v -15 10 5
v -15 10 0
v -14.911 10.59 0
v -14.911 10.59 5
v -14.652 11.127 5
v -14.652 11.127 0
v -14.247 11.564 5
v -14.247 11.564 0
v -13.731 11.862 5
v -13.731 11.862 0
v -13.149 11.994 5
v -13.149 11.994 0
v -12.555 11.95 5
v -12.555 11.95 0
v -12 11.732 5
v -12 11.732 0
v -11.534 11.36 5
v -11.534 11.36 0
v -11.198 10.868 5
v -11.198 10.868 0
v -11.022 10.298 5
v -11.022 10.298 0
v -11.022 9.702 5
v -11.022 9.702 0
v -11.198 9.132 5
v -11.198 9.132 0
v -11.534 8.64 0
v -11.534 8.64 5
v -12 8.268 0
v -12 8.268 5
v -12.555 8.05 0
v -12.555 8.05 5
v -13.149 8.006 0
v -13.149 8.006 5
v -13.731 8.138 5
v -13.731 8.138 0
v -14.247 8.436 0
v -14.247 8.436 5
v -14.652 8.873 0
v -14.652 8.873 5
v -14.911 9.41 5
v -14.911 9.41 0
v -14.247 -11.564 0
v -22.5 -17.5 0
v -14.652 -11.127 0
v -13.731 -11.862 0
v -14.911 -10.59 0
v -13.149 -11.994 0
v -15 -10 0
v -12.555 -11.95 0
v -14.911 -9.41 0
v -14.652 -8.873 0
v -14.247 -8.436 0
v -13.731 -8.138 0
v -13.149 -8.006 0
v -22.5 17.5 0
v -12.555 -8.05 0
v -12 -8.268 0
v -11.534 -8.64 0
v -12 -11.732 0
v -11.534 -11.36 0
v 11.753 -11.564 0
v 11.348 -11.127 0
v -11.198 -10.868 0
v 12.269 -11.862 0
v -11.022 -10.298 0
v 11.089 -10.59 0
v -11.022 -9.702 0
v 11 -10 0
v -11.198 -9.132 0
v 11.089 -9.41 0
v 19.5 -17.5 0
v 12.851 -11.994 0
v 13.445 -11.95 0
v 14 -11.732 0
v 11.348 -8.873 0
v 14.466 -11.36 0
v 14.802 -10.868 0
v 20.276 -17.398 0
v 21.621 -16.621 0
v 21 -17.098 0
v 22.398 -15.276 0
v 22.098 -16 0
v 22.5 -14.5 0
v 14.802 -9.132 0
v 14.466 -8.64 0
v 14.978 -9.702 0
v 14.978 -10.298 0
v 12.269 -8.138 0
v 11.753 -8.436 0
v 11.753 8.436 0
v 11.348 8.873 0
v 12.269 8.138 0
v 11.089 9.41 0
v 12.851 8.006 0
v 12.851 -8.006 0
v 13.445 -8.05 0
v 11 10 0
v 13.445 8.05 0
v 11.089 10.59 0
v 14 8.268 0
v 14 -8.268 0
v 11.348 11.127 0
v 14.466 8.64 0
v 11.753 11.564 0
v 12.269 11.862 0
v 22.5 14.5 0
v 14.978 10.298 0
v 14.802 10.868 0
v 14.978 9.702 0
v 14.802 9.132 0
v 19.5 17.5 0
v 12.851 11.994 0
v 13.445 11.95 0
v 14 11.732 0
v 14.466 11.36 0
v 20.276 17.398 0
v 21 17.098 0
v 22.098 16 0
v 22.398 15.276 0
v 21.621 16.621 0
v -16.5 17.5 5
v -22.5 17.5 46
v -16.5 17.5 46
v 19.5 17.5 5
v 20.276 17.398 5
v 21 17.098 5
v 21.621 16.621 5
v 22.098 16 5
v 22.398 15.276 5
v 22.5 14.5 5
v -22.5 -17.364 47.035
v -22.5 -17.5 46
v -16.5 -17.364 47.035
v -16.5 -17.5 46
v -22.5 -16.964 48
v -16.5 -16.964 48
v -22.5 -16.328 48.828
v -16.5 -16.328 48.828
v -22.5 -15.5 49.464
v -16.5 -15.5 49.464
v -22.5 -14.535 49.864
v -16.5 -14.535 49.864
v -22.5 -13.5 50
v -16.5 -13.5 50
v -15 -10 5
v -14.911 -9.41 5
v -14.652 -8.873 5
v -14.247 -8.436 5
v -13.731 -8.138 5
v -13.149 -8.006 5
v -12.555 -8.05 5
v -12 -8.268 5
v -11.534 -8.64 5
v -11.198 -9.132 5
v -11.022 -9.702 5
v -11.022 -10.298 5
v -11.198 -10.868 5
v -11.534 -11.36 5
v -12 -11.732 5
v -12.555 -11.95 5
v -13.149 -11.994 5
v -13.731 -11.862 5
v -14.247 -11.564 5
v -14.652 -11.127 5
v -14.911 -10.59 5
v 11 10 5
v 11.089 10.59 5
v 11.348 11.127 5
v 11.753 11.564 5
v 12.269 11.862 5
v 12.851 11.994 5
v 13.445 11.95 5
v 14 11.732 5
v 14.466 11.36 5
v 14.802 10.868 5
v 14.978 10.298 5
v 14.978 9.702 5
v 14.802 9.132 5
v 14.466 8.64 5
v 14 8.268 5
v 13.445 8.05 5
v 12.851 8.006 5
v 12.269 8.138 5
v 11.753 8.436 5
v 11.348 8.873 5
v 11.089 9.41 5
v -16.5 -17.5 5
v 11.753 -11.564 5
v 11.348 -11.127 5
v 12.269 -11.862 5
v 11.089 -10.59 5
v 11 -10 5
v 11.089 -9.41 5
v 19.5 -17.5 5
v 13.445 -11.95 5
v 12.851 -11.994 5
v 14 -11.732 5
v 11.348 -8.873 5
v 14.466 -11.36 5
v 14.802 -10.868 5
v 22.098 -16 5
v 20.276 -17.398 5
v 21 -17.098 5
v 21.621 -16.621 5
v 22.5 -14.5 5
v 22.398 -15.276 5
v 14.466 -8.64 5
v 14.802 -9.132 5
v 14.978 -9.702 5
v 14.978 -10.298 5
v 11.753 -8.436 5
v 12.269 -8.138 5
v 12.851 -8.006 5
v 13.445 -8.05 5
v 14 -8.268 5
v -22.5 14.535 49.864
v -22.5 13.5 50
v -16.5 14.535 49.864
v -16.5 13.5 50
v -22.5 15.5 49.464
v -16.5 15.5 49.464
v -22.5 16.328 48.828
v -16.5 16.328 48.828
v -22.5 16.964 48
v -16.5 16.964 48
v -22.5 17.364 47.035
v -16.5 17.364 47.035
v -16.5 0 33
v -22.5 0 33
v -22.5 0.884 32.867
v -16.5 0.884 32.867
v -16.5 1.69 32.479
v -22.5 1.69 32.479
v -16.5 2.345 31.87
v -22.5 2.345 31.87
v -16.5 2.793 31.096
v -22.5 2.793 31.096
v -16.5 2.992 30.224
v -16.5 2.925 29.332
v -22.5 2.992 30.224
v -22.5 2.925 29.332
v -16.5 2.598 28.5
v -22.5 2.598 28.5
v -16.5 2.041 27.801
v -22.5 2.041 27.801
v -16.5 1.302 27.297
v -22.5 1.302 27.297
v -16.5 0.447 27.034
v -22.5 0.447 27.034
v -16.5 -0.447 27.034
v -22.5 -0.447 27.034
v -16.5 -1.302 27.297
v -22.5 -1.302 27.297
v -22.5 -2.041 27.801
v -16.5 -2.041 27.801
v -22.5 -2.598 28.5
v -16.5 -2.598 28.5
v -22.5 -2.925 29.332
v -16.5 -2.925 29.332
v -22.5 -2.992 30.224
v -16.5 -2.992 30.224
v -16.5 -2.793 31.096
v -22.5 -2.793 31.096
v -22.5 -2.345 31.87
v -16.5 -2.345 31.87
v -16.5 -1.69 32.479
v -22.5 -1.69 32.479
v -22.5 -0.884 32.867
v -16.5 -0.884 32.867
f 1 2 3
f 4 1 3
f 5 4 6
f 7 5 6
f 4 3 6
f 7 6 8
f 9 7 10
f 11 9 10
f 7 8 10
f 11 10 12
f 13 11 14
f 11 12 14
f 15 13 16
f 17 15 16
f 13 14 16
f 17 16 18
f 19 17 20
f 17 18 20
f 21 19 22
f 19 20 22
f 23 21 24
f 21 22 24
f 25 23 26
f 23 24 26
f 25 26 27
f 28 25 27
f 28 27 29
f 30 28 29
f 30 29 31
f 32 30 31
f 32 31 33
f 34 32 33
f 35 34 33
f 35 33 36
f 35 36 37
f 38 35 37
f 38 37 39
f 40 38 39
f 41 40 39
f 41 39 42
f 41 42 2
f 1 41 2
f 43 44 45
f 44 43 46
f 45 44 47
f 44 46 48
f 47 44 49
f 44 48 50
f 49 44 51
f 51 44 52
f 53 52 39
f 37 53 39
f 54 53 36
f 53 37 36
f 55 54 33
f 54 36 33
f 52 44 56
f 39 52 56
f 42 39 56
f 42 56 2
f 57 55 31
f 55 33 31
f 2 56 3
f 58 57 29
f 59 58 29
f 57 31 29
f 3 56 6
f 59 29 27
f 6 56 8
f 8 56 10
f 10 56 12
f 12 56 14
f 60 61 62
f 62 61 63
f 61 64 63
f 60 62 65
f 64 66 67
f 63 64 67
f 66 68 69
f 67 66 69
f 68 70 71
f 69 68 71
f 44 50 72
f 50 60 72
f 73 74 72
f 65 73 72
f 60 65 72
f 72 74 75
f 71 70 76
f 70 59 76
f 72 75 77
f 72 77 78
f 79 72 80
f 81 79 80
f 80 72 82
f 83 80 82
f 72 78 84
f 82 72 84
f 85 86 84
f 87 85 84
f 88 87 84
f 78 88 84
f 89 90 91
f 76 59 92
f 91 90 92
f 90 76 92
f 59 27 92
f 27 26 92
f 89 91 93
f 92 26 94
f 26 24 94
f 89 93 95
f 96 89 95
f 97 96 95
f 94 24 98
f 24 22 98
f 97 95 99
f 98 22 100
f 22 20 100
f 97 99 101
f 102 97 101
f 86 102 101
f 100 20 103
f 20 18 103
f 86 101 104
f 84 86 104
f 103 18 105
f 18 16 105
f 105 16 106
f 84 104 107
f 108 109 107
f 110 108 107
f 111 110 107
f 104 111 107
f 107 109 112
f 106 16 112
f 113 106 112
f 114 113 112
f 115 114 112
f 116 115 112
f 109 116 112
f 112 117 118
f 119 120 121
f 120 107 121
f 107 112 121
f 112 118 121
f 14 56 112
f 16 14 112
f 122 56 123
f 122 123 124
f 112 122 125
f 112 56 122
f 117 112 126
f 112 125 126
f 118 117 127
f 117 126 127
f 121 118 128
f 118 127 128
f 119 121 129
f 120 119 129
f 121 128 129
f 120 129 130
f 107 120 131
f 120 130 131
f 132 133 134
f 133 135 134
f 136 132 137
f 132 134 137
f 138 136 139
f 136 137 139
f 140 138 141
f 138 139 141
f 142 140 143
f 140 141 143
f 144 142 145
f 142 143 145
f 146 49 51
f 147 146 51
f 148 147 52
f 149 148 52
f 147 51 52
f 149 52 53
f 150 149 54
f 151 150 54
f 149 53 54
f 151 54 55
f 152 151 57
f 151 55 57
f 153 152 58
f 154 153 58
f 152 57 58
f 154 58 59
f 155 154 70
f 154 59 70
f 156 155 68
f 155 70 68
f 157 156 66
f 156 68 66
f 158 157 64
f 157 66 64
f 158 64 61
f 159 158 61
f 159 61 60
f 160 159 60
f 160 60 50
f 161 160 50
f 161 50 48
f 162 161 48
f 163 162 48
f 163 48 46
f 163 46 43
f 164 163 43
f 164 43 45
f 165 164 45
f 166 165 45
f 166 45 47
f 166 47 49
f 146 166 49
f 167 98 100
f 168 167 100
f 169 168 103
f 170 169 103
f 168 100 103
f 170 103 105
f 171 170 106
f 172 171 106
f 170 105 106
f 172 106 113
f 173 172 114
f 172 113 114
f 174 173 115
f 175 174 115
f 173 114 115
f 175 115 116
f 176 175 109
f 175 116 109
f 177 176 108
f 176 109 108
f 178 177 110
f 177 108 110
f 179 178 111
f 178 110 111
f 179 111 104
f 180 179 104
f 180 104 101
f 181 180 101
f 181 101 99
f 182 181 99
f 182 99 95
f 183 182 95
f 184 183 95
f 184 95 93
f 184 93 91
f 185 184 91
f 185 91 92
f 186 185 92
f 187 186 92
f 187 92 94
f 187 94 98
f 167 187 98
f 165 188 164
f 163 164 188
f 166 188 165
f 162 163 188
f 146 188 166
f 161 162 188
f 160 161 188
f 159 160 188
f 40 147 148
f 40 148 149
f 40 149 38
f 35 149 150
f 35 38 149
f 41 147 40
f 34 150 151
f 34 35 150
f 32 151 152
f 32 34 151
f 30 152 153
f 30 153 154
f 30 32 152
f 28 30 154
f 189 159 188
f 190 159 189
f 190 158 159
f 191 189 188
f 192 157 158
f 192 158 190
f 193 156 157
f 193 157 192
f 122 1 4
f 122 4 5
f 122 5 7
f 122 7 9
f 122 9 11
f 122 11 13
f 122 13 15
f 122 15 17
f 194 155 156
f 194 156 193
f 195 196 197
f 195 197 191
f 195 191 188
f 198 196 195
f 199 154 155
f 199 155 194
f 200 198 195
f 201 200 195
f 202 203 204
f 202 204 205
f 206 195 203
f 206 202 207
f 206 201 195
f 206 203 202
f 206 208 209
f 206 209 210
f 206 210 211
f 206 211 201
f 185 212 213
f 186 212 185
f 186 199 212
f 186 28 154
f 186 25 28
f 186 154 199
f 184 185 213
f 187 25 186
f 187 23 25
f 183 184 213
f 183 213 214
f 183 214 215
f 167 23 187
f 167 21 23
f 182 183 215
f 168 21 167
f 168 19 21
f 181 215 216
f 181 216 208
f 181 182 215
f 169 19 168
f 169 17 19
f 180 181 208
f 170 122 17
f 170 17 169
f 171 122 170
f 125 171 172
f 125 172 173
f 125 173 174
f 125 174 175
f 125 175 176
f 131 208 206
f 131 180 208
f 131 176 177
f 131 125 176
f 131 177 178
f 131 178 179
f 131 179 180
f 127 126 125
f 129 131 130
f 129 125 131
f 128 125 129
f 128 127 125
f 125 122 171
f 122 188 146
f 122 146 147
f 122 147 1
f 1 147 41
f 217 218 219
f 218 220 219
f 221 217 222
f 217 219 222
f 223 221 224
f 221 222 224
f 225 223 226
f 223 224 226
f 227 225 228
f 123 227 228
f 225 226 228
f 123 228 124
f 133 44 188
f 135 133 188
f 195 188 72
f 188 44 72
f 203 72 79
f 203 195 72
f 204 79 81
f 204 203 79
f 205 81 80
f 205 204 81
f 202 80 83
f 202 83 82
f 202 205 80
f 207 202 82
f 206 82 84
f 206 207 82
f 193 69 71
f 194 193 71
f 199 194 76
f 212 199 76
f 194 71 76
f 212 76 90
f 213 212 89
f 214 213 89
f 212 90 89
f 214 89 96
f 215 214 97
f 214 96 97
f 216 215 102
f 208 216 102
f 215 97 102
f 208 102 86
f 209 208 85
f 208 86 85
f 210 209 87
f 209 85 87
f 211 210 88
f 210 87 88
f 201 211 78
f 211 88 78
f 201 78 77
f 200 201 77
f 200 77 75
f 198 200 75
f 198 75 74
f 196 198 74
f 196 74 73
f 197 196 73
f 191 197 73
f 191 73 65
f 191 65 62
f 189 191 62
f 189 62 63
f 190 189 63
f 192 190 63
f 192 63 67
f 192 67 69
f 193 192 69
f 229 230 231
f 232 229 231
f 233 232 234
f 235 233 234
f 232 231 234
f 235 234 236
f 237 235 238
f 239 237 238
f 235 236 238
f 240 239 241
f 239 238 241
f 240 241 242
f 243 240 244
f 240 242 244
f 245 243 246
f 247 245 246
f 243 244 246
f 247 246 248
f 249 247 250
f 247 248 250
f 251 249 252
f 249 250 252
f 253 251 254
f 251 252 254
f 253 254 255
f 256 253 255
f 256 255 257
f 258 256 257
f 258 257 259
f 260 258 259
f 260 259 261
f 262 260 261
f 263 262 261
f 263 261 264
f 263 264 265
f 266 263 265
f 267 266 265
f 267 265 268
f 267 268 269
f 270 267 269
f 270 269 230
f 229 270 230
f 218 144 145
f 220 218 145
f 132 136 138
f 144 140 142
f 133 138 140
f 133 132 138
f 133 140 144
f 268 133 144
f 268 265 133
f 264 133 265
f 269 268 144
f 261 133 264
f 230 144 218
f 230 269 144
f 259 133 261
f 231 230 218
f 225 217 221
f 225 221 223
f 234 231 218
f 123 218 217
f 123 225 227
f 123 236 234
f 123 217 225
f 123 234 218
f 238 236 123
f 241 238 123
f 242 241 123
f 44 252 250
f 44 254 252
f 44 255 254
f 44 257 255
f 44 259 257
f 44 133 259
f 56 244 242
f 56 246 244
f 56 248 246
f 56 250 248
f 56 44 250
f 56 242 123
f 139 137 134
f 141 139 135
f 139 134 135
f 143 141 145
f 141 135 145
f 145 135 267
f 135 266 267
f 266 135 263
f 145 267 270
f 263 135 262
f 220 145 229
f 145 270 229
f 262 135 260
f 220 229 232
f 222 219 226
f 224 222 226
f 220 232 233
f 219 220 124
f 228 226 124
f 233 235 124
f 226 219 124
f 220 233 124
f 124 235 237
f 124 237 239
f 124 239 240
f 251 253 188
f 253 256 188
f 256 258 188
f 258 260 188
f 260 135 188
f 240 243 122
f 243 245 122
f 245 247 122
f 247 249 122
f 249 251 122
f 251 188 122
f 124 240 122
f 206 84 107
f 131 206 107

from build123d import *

# Parameters (mm, degrees)
SKETCH_1_W          = 45
SKETCH_1_H          = 35
EXTRUDE_1_DEPTH     = 5
SKETCH_2_W          = 6
SKETCH_2_H          = 35
EXTRUDE_2_DEPTH     = 45
SKETCH_3_R          = 3
CUT_EXTRUDE_1_DEPTH = 70.507193872
FILLET_1_R          = 3
FILLET_2_R          = 4
CUT_EXTRUDE_2_REACH = 59.554
SKETCH_4_R          = 2


with BuildPart() as part:
    # 草图1 → 凸台-拉伸1 (new body)
    with BuildSketch(Plane.XY):
        Rectangle(SKETCH_1_W, SKETCH_1_H)
    extrude(amount=EXTRUDE_1_DEPTH)

    # 草图2 → 凸台-拉伸2 (add)
    with BuildSketch(Plane.XY.offset(5)):
        with Locations((-19.5, 0)):
            Rectangle(SKETCH_2_W, SKETCH_2_H)
    extrude(amount=EXTRUDE_2_DEPTH)

    # 草图3 → 切除-拉伸1 (cut, through all)
    with BuildSketch(Plane.ZY.offset(22.5)):
        with Locations((30, 0)):
            Circle(SKETCH_3_R)
    extrude(amount=-CUT_EXTRUDE_1_DEPTH, mode=Mode.SUBTRACT)

    # 圆角1
    fillet_1_edges = [part.edges().sort_by_distance(p)[0] for p in [
        (22.5, -17.5, 2.5),
        (22.5, 17.5, 2.5),
    ]]
    fillet(fillet_1_edges, radius=FILLET_1_R)

    # 圆角2
    fillet_2_edges = [part.edges().sort_by_distance(p)[0] for p in [
        (-19.5, -17.5, 50),
        (-19.5, 17.5, 50),
    ]]
    fillet(fillet_2_edges, radius=FILLET_2_R)

    # 草图4 → 切除-拉伸2 (cut, up to next)
    with BuildSketch(Plane(origin=(0, 0, 0), x_dir=(-1, 0, 0), z_dir=(0, 0, -1)), mode=Mode.PRIVATE) as cut_extrude_2_sk1:
        with Locations((-13, 10)):
            Circle(SKETCH_4_R)
    cut_extrude_2_tool1 = extrude(cut_extrude_2_sk1.sketch, amount=-CUT_EXTRUDE_2_REACH, mode=Mode.PRIVATE) & part.part
    # 草图4 → 切除-拉伸2 (cut, up to next)
    with BuildSketch(Plane(origin=(0, 0, 0), x_dir=(-1, 0, 0), z_dir=(0, 0, -1)), mode=Mode.PRIVATE) as cut_extrude_2_sk2:
        with Locations((13, 10)):
            Circle(SKETCH_4_R)
    cut_extrude_2_tool2 = extrude(cut_extrude_2_sk2.sketch, amount=-CUT_EXTRUDE_2_REACH, mode=Mode.PRIVATE) & part.part
    # 草图4 → 切除-拉伸2 (cut, up to next)
    with BuildSketch(Plane(origin=(0, 0, 0), x_dir=(-1, 0, 0), z_dir=(0, 0, -1)), mode=Mode.PRIVATE) as cut_extrude_2_sk3:
        with Locations((13, -10)):
            Circle(SKETCH_4_R)
    cut_extrude_2_tool3 = extrude(cut_extrude_2_sk3.sketch, amount=-CUT_EXTRUDE_2_REACH, mode=Mode.PRIVATE) & part.part
    # 草图4 → 切除-拉伸2 (cut, up to next)
    with BuildSketch(Plane(origin=(0, 0, 0), x_dir=(-1, 0, 0), z_dir=(0, 0, -1)), mode=Mode.PRIVATE) as cut_extrude_2_sk4:
        with Locations((-13, -10)):
            Circle(SKETCH_4_R)
    cut_extrude_2_tool4 = extrude(cut_extrude_2_sk4.sketch, amount=-CUT_EXTRUDE_2_REACH, mode=Mode.PRIVATE) & part.part
    add(cut_extrude_2_tool1.solids().sort_by_distance((13, 10, 0))[0], mode=Mode.SUBTRACT)
    add(cut_extrude_2_tool2.solids().sort_by_distance((-13, 10, 0))[0], mode=Mode.SUBTRACT)
    add(cut_extrude_2_tool3.solids().sort_by_distance((-13, -10, 0))[0], mode=Mode.SUBTRACT)
    add(cut_extrude_2_tool4.solids().sort_by_distance((13, -10, 0))[0], mode=Mode.SUBTRACT)


solid = part.part
